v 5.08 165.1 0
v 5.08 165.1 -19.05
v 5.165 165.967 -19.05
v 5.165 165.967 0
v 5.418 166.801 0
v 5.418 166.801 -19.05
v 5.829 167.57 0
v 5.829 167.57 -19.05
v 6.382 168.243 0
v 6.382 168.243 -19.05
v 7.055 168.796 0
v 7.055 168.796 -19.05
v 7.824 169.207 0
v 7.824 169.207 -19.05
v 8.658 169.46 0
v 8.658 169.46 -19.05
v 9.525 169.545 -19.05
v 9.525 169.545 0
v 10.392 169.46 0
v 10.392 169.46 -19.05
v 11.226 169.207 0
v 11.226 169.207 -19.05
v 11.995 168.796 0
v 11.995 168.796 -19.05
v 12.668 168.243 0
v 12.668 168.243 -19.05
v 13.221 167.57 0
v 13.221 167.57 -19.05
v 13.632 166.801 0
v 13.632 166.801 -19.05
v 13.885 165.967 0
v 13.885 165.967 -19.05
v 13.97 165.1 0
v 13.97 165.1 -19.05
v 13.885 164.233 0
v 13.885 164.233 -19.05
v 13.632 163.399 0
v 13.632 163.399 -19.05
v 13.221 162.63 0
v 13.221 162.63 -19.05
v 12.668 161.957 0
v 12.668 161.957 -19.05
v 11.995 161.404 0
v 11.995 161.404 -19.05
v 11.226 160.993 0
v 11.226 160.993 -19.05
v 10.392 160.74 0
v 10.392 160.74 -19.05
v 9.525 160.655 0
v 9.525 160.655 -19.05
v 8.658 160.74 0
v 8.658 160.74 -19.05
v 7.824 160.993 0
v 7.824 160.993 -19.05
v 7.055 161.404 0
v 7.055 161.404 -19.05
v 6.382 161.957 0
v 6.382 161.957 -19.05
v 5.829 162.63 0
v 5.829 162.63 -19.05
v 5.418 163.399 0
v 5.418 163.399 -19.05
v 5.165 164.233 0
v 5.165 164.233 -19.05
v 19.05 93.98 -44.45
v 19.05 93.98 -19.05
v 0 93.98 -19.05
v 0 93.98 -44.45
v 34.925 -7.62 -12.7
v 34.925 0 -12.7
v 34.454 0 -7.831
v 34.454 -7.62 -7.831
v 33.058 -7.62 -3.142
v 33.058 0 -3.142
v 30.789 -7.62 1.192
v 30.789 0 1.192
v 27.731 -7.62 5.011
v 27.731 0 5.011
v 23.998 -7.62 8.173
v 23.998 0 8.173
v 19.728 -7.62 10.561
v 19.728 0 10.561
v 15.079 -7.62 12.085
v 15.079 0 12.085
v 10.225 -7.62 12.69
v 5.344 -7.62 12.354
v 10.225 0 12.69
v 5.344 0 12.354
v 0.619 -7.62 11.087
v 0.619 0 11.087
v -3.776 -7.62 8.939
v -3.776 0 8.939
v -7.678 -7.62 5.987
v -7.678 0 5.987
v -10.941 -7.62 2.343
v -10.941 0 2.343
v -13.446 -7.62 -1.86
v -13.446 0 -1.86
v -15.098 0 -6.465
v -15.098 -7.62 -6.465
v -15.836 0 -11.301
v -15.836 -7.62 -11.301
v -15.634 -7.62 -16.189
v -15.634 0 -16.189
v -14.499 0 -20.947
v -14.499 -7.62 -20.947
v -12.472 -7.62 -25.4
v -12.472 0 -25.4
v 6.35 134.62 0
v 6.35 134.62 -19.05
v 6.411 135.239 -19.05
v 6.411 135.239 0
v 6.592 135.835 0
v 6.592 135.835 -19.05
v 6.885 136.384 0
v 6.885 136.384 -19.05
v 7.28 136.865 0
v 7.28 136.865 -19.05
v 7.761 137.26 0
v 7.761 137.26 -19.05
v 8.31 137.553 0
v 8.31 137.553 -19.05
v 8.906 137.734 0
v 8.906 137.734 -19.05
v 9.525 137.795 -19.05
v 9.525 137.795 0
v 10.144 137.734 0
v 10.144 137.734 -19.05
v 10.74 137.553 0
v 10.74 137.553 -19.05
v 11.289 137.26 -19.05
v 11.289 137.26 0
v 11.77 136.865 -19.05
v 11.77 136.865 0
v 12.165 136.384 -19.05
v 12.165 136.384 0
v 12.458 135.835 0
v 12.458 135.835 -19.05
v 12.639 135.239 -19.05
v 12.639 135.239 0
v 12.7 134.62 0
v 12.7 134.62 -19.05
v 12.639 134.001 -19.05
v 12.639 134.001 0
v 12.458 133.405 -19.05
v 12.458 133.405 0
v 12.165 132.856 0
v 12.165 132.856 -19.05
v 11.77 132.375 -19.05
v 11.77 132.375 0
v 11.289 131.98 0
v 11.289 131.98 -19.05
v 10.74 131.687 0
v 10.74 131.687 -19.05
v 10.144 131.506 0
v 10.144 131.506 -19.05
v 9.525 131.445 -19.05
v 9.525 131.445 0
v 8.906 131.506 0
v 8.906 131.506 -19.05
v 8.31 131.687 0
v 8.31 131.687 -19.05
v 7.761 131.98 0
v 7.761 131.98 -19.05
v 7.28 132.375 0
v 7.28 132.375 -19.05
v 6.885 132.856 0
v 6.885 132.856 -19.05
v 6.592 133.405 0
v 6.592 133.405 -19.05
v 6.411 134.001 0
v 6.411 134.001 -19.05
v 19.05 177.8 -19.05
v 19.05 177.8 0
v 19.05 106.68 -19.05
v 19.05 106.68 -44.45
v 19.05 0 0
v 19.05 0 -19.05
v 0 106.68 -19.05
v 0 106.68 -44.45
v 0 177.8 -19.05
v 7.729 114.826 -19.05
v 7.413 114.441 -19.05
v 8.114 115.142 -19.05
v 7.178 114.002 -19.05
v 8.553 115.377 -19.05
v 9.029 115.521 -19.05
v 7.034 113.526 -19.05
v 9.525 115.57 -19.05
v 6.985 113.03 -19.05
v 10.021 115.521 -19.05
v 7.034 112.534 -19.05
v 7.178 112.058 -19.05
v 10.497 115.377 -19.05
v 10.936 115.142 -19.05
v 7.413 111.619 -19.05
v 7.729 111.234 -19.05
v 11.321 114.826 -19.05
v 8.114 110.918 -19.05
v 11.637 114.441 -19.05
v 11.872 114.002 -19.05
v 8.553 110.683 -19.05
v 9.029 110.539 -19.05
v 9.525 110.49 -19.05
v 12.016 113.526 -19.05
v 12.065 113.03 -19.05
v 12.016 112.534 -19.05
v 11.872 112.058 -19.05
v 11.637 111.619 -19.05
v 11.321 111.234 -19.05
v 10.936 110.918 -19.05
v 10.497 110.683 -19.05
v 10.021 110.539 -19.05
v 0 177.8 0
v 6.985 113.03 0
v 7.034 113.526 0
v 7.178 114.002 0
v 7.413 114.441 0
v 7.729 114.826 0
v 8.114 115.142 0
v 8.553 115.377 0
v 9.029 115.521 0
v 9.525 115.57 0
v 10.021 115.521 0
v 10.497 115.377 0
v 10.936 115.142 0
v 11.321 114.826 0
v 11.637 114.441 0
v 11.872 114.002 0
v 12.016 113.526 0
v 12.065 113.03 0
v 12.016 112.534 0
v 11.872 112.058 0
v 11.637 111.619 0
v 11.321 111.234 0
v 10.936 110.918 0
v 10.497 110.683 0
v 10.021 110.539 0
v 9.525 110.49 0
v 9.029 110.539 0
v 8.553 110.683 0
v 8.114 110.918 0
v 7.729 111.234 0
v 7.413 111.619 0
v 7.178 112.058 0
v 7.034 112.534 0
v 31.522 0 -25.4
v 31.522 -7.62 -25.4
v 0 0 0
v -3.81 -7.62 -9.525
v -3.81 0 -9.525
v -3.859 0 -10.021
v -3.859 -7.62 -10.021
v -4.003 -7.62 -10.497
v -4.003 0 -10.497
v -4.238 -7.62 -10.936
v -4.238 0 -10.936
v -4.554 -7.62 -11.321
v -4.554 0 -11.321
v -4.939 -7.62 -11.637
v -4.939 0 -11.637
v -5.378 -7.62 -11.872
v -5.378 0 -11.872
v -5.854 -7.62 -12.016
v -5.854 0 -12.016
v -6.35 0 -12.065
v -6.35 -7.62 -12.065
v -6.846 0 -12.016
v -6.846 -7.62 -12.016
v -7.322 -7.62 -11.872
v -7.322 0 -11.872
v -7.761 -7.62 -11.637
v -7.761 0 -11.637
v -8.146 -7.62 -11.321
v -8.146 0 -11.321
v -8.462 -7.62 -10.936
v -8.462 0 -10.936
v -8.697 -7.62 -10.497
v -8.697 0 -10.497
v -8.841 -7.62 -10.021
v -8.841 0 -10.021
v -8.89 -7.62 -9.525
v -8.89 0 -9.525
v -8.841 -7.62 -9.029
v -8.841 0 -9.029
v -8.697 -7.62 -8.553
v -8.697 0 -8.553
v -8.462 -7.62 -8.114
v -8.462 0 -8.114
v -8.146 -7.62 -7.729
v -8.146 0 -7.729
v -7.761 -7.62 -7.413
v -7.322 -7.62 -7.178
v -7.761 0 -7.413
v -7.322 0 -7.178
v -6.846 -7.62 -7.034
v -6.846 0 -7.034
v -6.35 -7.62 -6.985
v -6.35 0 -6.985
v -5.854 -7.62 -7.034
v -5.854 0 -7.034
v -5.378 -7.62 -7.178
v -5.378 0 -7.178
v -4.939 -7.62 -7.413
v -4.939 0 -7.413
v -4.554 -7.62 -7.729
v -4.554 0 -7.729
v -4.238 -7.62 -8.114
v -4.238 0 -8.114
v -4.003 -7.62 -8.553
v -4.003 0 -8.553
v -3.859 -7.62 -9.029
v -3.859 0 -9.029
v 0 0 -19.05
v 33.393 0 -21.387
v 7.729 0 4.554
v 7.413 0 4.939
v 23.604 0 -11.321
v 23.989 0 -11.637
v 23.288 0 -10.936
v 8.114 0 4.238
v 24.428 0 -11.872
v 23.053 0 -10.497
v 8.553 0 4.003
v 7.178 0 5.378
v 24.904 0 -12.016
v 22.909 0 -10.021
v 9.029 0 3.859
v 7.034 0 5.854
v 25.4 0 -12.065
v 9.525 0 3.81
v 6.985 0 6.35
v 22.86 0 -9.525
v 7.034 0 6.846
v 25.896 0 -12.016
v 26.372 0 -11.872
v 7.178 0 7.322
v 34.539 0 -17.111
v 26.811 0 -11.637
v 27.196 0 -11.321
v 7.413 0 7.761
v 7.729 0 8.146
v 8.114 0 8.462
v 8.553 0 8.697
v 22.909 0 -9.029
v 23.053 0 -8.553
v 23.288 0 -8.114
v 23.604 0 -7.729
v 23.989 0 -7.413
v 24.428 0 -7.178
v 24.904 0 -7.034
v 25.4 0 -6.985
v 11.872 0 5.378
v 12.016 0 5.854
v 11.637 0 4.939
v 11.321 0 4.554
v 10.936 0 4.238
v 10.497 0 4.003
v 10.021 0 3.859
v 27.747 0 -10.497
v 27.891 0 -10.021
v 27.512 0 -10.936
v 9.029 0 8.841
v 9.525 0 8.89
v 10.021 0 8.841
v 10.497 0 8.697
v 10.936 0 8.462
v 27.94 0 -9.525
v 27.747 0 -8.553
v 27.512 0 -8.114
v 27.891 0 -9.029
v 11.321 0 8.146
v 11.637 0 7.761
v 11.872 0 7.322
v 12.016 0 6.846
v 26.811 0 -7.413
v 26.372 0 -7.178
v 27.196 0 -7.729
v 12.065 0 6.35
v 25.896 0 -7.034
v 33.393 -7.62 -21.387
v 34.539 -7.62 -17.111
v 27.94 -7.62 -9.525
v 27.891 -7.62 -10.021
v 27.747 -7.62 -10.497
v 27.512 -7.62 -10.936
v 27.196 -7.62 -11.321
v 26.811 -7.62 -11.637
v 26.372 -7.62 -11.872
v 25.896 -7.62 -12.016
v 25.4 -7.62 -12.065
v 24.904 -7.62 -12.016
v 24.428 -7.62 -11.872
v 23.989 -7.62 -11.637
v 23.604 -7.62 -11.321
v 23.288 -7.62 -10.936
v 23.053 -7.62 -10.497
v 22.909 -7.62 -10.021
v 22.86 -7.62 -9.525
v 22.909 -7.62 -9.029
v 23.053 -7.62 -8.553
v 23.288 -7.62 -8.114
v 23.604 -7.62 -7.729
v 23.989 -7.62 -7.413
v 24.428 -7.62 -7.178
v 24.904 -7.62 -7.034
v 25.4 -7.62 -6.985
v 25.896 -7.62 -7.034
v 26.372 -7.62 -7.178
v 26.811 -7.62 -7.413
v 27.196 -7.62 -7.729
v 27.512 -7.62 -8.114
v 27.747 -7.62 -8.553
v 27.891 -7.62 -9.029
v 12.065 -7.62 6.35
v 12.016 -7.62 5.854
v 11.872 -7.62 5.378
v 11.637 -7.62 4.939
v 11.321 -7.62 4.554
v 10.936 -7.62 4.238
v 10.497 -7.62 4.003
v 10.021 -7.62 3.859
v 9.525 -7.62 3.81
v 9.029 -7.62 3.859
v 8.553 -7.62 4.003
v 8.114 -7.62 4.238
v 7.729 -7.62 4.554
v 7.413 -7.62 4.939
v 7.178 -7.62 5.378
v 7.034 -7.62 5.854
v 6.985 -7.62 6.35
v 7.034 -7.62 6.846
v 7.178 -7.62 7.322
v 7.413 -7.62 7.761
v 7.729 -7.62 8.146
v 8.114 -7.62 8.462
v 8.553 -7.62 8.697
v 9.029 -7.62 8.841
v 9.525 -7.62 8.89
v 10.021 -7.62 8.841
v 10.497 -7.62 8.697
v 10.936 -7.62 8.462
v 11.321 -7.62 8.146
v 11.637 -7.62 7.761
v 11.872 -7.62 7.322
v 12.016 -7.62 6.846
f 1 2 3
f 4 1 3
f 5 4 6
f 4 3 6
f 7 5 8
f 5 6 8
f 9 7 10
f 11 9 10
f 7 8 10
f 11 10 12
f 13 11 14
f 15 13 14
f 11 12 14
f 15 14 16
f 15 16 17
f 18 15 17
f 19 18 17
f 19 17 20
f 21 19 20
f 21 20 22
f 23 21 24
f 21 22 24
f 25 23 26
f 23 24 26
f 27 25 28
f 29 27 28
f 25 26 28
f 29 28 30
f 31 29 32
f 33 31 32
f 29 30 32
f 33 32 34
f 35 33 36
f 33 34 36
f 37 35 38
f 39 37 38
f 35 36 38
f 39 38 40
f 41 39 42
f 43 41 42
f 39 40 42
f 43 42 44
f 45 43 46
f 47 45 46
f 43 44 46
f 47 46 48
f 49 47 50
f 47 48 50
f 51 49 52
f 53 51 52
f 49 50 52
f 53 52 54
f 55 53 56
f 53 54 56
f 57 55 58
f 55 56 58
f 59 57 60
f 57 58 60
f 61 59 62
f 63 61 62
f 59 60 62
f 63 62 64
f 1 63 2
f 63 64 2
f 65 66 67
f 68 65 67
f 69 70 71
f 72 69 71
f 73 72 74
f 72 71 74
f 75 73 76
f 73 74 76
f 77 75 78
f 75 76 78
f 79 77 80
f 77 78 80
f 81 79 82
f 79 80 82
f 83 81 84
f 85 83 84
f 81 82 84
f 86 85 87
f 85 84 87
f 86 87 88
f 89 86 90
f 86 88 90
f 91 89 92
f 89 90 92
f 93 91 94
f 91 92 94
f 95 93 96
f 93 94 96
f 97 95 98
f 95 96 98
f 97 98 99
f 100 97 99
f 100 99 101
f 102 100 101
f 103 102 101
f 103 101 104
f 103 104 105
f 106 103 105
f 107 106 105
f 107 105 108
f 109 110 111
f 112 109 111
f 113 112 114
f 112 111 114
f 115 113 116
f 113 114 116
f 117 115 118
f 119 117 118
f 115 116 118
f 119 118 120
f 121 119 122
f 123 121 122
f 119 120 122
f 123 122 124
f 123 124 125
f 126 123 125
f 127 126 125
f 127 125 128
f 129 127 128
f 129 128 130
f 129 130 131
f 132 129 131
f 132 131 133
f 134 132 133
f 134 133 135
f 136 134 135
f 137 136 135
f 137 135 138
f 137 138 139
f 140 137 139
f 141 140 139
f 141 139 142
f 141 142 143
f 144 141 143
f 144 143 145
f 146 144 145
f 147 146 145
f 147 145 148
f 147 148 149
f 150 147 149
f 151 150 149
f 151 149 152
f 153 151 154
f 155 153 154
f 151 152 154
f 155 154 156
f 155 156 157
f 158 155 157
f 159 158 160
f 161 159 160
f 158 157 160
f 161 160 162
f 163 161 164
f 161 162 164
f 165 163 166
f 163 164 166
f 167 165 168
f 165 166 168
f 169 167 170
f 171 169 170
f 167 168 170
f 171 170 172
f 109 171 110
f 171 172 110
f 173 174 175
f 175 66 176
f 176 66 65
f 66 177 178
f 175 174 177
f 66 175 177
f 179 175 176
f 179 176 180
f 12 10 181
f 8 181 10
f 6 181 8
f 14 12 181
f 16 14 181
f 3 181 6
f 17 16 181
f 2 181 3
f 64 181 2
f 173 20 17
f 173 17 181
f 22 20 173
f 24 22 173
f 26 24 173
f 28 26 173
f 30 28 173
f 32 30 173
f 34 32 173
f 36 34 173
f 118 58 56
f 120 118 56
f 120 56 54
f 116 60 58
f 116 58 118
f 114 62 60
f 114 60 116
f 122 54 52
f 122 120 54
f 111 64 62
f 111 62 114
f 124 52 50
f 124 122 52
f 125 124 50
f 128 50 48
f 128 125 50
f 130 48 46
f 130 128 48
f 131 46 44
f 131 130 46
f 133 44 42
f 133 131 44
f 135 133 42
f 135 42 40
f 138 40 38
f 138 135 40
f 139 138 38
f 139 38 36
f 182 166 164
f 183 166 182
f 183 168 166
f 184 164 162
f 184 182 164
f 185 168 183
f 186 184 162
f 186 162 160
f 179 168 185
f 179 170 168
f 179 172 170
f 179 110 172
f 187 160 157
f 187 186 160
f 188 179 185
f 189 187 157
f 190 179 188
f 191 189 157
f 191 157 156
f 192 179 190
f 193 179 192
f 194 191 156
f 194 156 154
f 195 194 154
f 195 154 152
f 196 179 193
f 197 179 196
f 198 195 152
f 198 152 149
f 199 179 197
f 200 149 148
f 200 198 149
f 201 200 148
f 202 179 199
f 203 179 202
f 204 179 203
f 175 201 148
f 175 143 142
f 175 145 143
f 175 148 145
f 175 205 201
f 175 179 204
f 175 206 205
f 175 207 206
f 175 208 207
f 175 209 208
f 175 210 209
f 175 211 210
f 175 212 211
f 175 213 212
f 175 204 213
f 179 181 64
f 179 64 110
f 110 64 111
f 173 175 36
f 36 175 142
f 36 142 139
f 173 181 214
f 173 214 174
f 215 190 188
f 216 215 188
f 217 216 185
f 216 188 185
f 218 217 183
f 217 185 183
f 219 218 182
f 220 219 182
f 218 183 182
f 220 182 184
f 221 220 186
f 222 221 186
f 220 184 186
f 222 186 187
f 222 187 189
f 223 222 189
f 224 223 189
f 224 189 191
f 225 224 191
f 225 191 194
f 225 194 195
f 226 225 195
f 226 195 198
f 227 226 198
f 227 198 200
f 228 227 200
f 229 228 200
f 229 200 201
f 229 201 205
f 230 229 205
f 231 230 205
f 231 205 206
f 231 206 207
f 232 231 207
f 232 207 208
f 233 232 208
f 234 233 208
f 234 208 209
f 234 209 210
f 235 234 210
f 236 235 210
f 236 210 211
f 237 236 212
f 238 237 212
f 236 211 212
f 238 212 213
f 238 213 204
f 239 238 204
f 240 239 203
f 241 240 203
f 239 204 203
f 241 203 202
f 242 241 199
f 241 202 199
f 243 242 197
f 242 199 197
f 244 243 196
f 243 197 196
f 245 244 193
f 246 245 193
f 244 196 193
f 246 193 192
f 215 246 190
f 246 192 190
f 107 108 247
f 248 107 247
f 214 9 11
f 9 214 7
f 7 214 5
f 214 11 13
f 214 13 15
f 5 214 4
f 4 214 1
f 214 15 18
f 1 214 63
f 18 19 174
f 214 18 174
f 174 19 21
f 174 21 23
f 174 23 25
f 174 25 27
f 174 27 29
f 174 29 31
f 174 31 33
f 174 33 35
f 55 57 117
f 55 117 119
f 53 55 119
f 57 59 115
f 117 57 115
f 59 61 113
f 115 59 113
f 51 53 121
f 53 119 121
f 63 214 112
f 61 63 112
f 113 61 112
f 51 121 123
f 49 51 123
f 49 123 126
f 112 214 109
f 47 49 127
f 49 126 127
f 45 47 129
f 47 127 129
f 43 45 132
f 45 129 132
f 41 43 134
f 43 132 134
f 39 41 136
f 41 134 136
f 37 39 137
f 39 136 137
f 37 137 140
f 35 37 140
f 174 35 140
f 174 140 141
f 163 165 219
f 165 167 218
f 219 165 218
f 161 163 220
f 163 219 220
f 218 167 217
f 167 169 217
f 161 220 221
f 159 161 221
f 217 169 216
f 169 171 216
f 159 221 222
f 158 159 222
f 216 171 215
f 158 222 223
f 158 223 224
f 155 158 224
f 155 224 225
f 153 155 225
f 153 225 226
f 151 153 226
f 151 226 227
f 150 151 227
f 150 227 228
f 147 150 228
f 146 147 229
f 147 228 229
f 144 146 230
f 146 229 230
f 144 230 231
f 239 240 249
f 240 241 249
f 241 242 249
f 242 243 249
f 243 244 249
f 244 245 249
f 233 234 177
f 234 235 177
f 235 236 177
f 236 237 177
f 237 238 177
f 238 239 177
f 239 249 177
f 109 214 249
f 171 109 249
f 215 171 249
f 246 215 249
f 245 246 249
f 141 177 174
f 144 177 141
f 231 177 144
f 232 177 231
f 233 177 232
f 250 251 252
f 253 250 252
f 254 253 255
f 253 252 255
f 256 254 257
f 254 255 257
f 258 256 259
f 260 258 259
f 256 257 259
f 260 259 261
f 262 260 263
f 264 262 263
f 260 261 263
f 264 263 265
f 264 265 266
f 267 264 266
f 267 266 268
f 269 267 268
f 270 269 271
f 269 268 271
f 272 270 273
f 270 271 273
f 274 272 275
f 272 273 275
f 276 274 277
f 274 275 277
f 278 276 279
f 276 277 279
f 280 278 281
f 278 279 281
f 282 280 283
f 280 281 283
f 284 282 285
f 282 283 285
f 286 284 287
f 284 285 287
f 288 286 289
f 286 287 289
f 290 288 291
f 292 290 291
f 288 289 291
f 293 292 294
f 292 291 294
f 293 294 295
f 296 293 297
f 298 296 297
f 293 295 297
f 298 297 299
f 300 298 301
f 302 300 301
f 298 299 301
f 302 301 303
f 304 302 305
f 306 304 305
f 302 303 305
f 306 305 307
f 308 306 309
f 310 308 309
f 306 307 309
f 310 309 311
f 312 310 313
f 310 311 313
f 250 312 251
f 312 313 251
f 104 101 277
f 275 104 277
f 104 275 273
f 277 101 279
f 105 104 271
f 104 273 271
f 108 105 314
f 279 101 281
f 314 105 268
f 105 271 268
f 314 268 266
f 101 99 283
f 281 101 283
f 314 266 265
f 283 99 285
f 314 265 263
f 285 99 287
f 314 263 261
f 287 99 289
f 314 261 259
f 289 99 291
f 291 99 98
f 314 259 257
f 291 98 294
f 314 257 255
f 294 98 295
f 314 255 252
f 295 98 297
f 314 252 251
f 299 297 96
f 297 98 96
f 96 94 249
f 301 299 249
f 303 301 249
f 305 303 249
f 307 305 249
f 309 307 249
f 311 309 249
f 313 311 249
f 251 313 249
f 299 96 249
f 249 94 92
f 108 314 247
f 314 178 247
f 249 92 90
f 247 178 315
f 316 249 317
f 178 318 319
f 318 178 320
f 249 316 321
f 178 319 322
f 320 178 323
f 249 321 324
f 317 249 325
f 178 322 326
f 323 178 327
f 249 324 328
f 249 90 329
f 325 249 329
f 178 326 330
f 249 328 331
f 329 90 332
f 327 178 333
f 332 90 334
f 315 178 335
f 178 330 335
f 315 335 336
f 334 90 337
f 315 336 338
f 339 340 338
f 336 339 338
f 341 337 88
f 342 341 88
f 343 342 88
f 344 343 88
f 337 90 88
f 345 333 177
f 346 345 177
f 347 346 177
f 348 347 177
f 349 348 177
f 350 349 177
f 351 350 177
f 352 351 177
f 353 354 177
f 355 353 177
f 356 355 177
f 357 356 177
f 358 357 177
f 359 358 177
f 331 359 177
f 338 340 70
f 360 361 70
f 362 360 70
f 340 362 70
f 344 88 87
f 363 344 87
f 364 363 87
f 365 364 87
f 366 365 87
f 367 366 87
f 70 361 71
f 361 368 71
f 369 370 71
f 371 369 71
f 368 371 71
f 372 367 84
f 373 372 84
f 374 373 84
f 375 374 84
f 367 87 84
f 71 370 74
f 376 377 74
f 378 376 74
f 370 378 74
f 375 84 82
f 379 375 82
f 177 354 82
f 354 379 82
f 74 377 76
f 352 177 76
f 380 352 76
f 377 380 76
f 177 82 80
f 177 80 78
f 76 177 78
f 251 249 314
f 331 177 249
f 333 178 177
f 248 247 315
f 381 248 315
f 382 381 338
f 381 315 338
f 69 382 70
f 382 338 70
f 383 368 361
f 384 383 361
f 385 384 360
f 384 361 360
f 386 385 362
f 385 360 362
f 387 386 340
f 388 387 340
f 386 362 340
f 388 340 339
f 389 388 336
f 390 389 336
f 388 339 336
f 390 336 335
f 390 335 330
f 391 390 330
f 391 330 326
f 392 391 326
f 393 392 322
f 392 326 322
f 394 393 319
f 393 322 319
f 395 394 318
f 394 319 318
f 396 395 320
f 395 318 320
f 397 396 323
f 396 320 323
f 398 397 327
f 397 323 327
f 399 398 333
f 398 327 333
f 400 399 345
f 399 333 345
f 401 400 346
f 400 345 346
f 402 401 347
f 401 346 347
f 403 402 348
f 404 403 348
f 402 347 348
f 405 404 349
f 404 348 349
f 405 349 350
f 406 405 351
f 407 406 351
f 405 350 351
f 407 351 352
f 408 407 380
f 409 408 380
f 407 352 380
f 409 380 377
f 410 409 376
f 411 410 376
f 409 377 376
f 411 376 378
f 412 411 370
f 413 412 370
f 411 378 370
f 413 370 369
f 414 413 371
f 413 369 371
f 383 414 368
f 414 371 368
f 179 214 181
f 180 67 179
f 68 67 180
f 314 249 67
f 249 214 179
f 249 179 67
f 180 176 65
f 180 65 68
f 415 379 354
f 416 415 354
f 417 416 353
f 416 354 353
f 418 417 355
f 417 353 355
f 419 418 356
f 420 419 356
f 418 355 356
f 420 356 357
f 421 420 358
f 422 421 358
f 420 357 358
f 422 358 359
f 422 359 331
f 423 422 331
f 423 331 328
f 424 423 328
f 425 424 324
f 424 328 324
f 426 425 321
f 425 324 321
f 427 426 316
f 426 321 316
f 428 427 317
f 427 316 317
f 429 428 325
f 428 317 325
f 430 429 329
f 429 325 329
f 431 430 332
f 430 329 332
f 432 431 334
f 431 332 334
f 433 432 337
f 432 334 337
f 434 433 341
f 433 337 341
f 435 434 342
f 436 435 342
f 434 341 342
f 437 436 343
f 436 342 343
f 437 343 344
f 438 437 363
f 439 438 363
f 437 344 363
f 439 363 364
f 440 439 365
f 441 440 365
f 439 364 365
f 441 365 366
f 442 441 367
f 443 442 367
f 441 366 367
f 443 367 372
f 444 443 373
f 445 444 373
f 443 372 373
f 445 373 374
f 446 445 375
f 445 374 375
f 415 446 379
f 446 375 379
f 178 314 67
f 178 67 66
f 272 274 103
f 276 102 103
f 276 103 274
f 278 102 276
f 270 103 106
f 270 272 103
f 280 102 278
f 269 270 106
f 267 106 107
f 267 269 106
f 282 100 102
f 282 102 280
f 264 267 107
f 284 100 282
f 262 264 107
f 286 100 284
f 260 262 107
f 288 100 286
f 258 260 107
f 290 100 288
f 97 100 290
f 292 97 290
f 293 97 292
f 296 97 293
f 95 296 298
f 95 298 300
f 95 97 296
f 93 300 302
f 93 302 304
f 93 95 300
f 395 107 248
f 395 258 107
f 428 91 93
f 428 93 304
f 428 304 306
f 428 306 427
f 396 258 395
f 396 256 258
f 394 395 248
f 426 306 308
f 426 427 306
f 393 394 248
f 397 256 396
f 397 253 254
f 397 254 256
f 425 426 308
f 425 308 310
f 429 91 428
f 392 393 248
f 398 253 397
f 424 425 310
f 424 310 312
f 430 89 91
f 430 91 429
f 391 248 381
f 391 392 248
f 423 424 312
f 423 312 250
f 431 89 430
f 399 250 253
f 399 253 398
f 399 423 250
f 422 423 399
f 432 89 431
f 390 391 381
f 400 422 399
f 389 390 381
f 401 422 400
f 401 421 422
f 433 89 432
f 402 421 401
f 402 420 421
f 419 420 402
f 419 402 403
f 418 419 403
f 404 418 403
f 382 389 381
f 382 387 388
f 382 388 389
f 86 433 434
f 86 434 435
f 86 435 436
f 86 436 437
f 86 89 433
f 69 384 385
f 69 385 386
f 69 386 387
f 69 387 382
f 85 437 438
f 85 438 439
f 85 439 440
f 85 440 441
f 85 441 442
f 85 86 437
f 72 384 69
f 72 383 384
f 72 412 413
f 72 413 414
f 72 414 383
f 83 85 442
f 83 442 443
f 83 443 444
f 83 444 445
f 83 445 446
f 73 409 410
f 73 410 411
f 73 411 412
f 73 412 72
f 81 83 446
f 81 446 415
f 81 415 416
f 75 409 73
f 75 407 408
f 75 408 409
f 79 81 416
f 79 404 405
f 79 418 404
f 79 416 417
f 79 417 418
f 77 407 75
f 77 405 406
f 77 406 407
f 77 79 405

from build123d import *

# Parameters (mm, degrees)
SKETCH1_W           = 19.05
SKETCH1_H           = 19.05
BOSS_EXTRUDE1_DEPTH = 177.8
BOSS_EXTRUDE2_DEPTH = 7.62
SKETCH3_R           = 2.54
CUT_EXTRUDE1_DEPTH  = 7.62
SKETCH4_R           = 4.445
CUT_EXTRUDE2_DEPTH  = 19.05
SKETCH5_R           = 3.175
SKETCH5_R_2         = 2.54
CUT_EXTRUDE3_DEPTH  = 38.1
SKETCH6_W           = 19.05
SKETCH6_H           = 12.7
BOSS_EXTRUDE3_DEPTH = 25.4


with BuildPart() as part:
    # Sketch1 → Boss-Extrude1 (new body)
    with BuildSketch(Plane(origin=(0, 0, 0), x_dir=(1, 0, 0), z_dir=(0, 1, 0))):
        with Locations((9.525, 9.525)):
            Rectangle(SKETCH1_W, SKETCH1_H)
    extrude(amount=BOSS_EXTRUDE1_DEPTH)

    # Sketch2 → Boss-Extrude2 (add)
    with BuildSketch(Plane.XZ):
        with BuildLine():
            ThreePointArc((34.925, -12.7), (2.950996254, 11.834515988), (-12.472045256, -25.4))
            Line((-12.472045256, -25.4), (31.522045256, -25.4))
            ThreePointArc((31.522045256, -25.4), (34.059515988, -19.274003746), (34.925, -12.7))
        make_face()
    extrude(amount=BOSS_EXTRUDE2_DEPTH)

    # Sketch3 → Cut-Extrude1 (cut)
    with BuildSketch(Plane(origin=(0, 0, 0), x_dir=(1, 0, 0), z_dir=(0, 1, 0))):
        with Locations((-6.35, 9.525)):
            Circle(SKETCH3_R)
        with Locations((25.4, 9.525)):
            Circle(SKETCH3_R)
        with Locations((9.525, -6.35)):
            Circle(SKETCH3_R)
    extrude(amount=-CUT_EXTRUDE1_DEPTH, mode=Mode.SUBTRACT)

    # Sketch4 → Cut-Extrude2 (cut)
    with BuildSketch(Plane(origin=(0, 0, -19.05), x_dir=(-1, 0, 0), z_dir=(0, 0, -1))):
        with Locations((-9.525, 165.1)):
            Circle(SKETCH4_R)
    extrude(amount=-CUT_EXTRUDE2_DEPTH, mode=Mode.SUBTRACT)

    # Sketch5 → Cut-Extrude3 (cut)
    with BuildSketch(Plane(origin=(0, 0, -19.05), x_dir=(-1, 0, 0), z_dir=(0, 0, -1))):
        with Locations((-9.525, 134.62)):
            Circle(SKETCH5_R)
        with Locations((-9.525, 113.03)):
            Circle(SKETCH5_R_2)
    extrude(amount=-CUT_EXTRUDE3_DEPTH, mode=Mode.SUBTRACT)

    # Sketch6 → Boss-Extrude3 (add)
    with BuildSketch(Plane(origin=(0, 0, -19.05), x_dir=(-1, 0, 0), z_dir=(0, 0, -1))):
        with Locations((-9.525, 100.33)):
            Rectangle(SKETCH6_W, SKETCH6_H)
    extrude(amount=BOSS_EXTRUDE3_DEPTH)


solid = part.part
